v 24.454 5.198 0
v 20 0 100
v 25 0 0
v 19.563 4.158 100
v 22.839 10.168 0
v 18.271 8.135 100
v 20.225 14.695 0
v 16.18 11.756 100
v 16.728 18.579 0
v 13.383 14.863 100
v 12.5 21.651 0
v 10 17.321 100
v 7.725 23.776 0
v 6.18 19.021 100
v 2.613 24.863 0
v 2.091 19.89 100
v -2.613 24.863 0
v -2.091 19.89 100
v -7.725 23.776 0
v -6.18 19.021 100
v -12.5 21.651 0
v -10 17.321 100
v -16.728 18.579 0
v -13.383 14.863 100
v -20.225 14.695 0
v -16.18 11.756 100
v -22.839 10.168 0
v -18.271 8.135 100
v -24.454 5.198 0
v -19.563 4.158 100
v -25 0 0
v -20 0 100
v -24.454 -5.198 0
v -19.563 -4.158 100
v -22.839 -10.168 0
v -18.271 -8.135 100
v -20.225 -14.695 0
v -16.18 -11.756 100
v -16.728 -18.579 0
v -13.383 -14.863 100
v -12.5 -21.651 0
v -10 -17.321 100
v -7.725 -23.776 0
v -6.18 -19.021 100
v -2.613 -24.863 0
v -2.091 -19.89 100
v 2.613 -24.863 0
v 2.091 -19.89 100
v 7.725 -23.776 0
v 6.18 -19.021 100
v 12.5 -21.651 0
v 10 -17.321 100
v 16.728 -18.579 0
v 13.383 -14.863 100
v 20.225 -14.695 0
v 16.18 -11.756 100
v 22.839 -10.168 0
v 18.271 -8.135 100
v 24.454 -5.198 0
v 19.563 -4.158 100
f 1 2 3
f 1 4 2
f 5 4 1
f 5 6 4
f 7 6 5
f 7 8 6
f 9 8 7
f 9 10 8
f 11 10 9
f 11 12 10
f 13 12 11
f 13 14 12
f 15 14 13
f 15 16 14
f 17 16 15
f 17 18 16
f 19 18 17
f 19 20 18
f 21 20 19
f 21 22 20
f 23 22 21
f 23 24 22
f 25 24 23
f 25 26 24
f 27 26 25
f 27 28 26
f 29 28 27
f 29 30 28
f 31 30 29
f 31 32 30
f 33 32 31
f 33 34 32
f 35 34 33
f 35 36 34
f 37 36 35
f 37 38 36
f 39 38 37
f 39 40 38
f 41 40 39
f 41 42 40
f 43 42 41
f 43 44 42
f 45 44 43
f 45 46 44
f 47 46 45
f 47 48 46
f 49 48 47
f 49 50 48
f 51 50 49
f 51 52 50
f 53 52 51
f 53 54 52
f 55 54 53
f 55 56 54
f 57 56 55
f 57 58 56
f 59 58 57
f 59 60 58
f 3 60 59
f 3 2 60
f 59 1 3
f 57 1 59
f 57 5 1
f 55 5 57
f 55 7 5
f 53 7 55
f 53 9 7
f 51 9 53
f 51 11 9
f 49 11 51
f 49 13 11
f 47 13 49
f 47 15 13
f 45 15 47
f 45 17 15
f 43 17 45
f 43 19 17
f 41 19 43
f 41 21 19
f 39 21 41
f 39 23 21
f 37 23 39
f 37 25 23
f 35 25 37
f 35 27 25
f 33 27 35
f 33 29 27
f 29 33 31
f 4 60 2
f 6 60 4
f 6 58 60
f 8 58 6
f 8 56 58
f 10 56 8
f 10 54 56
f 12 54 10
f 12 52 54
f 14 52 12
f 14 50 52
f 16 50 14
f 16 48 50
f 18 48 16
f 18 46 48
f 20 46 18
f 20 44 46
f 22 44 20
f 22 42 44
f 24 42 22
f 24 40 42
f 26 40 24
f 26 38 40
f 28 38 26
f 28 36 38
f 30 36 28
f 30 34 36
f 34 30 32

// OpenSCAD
// Unit of length: Unit.INCH
cylinder(h = 100.0, d1 = 50.0, d2 = 40.0, center = false, $fa = 12.0, $fs = 2.0, $fn = 0);
